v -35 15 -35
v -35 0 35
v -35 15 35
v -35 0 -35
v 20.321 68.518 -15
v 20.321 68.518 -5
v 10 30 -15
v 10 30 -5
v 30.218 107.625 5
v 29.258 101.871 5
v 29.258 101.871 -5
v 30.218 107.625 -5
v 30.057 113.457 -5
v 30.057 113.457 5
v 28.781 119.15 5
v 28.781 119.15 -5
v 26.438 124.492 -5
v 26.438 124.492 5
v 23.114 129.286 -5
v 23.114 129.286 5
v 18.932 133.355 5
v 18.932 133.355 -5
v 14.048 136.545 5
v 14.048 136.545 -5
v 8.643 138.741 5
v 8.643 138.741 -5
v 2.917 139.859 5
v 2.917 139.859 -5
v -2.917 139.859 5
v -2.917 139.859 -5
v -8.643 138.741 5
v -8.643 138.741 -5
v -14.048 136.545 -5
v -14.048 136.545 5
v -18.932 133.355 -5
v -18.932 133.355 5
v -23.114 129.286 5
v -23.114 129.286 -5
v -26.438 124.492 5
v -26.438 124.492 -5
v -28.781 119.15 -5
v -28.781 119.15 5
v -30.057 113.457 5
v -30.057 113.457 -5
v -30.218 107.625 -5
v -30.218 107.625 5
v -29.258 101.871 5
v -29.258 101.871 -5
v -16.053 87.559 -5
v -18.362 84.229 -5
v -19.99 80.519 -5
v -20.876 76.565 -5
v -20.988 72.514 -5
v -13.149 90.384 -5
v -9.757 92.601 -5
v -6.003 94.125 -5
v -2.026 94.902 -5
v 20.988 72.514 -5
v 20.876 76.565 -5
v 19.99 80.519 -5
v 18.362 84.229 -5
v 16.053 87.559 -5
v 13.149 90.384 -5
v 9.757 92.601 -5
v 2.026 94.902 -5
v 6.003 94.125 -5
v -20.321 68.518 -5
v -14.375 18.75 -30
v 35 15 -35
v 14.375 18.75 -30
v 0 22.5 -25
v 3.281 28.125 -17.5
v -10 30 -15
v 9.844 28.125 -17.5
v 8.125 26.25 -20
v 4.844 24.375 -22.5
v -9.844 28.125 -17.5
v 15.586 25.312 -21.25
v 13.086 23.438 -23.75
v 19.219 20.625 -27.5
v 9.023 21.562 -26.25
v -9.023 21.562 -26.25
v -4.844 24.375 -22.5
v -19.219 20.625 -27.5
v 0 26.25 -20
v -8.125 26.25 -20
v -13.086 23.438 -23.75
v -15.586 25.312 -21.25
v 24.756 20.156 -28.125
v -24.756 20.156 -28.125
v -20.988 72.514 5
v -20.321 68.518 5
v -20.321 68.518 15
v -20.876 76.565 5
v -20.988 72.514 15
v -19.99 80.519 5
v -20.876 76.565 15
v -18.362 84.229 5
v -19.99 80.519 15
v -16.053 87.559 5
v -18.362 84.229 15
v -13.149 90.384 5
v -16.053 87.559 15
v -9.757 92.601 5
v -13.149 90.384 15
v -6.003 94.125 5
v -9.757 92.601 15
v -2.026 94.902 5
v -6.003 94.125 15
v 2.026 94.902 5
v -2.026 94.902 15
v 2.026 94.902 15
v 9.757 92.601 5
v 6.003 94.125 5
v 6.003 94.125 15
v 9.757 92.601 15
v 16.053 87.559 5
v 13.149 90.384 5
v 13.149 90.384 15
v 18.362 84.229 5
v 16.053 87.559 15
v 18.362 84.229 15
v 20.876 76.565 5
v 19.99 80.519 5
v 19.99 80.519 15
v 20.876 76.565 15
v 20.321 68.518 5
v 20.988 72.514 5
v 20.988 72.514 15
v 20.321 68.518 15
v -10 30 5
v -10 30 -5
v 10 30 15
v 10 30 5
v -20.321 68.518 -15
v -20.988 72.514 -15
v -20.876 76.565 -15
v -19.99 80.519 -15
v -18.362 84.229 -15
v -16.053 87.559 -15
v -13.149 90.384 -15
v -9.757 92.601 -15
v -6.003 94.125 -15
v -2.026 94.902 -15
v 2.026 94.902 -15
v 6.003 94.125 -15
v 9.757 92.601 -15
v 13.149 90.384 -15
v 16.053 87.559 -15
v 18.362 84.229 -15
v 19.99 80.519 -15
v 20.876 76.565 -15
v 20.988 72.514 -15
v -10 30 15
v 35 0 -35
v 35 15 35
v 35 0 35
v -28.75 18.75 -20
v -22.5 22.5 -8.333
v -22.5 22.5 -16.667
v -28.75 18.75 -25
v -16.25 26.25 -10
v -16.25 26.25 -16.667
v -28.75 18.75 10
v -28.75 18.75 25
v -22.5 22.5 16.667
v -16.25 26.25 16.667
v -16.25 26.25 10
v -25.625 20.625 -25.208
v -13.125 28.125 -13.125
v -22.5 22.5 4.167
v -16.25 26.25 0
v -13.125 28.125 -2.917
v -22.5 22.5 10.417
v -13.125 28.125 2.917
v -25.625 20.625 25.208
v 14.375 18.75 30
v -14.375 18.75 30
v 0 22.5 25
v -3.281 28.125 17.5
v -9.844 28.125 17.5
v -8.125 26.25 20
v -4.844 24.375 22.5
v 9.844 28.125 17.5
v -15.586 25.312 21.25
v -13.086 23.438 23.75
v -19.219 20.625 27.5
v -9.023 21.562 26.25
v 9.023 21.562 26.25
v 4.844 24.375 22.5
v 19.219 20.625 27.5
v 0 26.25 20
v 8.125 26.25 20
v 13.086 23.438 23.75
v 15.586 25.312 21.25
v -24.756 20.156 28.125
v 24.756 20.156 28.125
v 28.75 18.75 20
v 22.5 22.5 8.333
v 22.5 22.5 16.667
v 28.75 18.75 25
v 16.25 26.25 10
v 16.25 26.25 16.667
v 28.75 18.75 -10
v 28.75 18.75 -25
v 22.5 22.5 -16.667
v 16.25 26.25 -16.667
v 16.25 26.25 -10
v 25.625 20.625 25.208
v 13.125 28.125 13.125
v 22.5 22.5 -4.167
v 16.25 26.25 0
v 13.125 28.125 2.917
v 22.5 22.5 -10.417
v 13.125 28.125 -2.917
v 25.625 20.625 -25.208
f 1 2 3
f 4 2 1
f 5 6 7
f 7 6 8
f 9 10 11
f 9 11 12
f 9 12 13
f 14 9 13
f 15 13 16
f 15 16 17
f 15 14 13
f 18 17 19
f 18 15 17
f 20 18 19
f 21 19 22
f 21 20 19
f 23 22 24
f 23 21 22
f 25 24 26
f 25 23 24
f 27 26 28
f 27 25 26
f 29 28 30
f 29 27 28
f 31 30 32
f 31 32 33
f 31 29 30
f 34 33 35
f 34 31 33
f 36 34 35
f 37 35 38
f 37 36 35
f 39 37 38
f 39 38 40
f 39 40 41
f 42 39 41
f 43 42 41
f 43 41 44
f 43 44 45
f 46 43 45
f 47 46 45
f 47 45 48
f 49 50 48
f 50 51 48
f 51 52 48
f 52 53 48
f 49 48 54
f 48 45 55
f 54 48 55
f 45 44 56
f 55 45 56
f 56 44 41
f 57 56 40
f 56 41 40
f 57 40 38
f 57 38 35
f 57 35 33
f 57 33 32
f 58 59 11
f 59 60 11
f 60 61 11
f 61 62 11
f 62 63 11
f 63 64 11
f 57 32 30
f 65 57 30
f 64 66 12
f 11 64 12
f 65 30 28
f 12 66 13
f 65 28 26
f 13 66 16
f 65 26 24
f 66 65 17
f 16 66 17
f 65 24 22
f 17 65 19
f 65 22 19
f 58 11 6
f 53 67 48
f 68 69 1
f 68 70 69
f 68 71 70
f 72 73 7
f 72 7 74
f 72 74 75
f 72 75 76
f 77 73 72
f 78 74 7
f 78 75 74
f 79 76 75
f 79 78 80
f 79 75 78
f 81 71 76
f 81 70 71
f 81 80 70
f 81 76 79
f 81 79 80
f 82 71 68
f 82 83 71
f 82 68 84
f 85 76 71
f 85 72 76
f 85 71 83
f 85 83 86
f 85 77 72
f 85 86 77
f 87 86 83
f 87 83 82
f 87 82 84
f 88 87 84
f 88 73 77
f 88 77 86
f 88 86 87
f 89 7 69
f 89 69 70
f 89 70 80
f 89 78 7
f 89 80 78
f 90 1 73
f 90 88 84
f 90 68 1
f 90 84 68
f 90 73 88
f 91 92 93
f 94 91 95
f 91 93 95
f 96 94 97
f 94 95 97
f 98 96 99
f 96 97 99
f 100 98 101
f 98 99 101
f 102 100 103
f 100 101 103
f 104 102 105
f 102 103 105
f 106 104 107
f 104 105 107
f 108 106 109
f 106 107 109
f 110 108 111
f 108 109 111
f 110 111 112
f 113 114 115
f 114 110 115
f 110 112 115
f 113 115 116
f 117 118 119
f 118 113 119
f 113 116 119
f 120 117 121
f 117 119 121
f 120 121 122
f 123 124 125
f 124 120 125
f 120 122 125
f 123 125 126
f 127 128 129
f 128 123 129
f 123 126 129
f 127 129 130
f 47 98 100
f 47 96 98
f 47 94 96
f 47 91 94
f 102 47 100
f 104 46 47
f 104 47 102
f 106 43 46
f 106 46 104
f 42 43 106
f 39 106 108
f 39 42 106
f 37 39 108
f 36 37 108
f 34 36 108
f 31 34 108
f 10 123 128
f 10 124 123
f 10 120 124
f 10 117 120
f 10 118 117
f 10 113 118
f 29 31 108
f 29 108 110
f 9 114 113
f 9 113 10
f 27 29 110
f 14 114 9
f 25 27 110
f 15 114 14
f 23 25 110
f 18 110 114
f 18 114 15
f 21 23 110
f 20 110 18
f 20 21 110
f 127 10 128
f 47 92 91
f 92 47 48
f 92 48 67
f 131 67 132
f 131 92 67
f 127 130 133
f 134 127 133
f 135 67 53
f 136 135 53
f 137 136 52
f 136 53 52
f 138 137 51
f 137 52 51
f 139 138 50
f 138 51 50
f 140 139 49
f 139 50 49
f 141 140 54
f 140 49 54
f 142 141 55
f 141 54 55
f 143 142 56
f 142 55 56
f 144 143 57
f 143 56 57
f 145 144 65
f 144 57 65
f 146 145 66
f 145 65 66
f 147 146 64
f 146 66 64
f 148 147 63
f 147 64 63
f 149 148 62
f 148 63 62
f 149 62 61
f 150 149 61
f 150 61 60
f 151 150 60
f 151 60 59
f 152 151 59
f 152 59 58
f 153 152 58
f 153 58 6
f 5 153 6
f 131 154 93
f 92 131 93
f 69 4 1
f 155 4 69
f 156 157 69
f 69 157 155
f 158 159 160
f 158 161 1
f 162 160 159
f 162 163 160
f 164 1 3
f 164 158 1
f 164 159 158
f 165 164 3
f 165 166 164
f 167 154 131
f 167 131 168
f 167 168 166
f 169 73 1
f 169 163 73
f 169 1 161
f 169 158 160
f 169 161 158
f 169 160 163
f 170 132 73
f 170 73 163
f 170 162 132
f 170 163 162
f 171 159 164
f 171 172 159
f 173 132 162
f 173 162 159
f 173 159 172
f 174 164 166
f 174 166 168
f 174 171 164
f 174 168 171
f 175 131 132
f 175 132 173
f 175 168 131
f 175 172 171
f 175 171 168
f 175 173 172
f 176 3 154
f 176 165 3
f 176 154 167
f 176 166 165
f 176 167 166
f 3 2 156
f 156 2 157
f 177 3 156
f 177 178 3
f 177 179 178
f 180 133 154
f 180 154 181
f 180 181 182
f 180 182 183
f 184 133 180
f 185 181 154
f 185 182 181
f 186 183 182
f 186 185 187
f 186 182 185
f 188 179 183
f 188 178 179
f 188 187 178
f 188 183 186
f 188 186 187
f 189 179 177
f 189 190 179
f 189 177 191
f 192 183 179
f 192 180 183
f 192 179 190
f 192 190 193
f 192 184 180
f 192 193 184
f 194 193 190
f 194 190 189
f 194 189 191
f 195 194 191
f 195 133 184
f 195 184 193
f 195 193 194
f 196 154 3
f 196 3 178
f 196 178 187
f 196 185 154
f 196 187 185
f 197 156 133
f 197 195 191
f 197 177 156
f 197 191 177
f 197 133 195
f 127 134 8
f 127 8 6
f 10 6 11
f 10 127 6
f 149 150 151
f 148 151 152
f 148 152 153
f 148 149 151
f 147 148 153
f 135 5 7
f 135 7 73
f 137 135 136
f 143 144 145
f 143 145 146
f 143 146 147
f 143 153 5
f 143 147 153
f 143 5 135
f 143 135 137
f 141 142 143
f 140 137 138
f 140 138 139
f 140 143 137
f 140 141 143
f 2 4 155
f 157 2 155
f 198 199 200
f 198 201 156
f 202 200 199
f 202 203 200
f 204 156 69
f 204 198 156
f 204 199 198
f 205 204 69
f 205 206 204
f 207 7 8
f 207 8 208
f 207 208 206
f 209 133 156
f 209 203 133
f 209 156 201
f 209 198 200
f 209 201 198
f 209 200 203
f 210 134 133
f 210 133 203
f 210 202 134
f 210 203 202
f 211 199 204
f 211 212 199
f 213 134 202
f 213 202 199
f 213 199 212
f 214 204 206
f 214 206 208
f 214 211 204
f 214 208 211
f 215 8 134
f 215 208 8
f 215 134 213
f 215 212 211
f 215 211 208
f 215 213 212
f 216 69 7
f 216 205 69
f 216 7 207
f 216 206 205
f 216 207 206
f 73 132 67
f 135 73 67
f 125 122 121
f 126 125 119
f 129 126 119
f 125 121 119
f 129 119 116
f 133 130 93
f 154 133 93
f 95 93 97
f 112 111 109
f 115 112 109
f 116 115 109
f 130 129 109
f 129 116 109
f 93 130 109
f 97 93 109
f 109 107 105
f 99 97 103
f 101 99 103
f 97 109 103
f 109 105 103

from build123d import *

# Parameters (mm, degrees)
SKETCH1_W      = 70
SKETCH1_H      = 70
EXTRUDE1_DEPTH = 15
SKETCH2_W      = 70
SKETCH2_H      = 70
SKETCH3_W      = 20
SKETCH3_H      = 30
EXTRUDE2_DEPTH = 5
EXTRUDE3_DEPTH = 15


with BuildPart() as part:
    # Sketch1 → Extrude1 (new body)
    with BuildSketch(Plane(origin=(0, 0, 0), x_dir=(1, 0, 0), z_dir=(0, 1, 0))):
        Rectangle(SKETCH1_W, SKETCH1_H)
    extrude(amount=EXTRUDE1_DEPTH)

    # Sketch2 → Loft1 section 0
    with BuildSketch(Plane(origin=(0, 15, 0), x_dir=(-1, 0, 0), z_dir=(0, 1, 0))):
        Rectangle(SKETCH2_W, SKETCH2_H)
    # Sketch3 → Loft1 section 1
    with BuildSketch(Plane(origin=(0, 30, 0), x_dir=(-1, 0, 0), z_dir=(0, 1, 0))):
        Rectangle(SKETCH3_W, SKETCH3_H)
    loft()

    # Sketch4 → Extrude2 (add, symmetric)
    with BuildSketch(Plane.XY):
        with BuildLine():
            Line((10, 30), (29.257681763, 101.870646776))
            ThreePointArc((29.257681763, 101.870646776), (0, 140), (-29.257681763, 101.870646776))
            Line((-29.257681763, 101.870646776), (-10, 30))
            Line((-10, 30), (10, 30))
        make_face()
    extrude(amount=EXTRUDE2_DEPTH, both=True)

    # Sketch5 → Extrude3 (add, symmetric)
    with BuildSketch(Plane.XY):
        with BuildLine():
            Line((20.320734039, 68.517503805), (10, 30))
            Line((10, 30), (-10, 30))
            Line((-10, 30), (-20.320734039, 68.517503805))
            ThreePointArc((-20.320734039, 68.517503805), (0, 95), (20.320734039, 68.517503805))
        make_face()
    extrude(amount=EXTRUDE3_DEPTH, both=True)


solid = part.part
